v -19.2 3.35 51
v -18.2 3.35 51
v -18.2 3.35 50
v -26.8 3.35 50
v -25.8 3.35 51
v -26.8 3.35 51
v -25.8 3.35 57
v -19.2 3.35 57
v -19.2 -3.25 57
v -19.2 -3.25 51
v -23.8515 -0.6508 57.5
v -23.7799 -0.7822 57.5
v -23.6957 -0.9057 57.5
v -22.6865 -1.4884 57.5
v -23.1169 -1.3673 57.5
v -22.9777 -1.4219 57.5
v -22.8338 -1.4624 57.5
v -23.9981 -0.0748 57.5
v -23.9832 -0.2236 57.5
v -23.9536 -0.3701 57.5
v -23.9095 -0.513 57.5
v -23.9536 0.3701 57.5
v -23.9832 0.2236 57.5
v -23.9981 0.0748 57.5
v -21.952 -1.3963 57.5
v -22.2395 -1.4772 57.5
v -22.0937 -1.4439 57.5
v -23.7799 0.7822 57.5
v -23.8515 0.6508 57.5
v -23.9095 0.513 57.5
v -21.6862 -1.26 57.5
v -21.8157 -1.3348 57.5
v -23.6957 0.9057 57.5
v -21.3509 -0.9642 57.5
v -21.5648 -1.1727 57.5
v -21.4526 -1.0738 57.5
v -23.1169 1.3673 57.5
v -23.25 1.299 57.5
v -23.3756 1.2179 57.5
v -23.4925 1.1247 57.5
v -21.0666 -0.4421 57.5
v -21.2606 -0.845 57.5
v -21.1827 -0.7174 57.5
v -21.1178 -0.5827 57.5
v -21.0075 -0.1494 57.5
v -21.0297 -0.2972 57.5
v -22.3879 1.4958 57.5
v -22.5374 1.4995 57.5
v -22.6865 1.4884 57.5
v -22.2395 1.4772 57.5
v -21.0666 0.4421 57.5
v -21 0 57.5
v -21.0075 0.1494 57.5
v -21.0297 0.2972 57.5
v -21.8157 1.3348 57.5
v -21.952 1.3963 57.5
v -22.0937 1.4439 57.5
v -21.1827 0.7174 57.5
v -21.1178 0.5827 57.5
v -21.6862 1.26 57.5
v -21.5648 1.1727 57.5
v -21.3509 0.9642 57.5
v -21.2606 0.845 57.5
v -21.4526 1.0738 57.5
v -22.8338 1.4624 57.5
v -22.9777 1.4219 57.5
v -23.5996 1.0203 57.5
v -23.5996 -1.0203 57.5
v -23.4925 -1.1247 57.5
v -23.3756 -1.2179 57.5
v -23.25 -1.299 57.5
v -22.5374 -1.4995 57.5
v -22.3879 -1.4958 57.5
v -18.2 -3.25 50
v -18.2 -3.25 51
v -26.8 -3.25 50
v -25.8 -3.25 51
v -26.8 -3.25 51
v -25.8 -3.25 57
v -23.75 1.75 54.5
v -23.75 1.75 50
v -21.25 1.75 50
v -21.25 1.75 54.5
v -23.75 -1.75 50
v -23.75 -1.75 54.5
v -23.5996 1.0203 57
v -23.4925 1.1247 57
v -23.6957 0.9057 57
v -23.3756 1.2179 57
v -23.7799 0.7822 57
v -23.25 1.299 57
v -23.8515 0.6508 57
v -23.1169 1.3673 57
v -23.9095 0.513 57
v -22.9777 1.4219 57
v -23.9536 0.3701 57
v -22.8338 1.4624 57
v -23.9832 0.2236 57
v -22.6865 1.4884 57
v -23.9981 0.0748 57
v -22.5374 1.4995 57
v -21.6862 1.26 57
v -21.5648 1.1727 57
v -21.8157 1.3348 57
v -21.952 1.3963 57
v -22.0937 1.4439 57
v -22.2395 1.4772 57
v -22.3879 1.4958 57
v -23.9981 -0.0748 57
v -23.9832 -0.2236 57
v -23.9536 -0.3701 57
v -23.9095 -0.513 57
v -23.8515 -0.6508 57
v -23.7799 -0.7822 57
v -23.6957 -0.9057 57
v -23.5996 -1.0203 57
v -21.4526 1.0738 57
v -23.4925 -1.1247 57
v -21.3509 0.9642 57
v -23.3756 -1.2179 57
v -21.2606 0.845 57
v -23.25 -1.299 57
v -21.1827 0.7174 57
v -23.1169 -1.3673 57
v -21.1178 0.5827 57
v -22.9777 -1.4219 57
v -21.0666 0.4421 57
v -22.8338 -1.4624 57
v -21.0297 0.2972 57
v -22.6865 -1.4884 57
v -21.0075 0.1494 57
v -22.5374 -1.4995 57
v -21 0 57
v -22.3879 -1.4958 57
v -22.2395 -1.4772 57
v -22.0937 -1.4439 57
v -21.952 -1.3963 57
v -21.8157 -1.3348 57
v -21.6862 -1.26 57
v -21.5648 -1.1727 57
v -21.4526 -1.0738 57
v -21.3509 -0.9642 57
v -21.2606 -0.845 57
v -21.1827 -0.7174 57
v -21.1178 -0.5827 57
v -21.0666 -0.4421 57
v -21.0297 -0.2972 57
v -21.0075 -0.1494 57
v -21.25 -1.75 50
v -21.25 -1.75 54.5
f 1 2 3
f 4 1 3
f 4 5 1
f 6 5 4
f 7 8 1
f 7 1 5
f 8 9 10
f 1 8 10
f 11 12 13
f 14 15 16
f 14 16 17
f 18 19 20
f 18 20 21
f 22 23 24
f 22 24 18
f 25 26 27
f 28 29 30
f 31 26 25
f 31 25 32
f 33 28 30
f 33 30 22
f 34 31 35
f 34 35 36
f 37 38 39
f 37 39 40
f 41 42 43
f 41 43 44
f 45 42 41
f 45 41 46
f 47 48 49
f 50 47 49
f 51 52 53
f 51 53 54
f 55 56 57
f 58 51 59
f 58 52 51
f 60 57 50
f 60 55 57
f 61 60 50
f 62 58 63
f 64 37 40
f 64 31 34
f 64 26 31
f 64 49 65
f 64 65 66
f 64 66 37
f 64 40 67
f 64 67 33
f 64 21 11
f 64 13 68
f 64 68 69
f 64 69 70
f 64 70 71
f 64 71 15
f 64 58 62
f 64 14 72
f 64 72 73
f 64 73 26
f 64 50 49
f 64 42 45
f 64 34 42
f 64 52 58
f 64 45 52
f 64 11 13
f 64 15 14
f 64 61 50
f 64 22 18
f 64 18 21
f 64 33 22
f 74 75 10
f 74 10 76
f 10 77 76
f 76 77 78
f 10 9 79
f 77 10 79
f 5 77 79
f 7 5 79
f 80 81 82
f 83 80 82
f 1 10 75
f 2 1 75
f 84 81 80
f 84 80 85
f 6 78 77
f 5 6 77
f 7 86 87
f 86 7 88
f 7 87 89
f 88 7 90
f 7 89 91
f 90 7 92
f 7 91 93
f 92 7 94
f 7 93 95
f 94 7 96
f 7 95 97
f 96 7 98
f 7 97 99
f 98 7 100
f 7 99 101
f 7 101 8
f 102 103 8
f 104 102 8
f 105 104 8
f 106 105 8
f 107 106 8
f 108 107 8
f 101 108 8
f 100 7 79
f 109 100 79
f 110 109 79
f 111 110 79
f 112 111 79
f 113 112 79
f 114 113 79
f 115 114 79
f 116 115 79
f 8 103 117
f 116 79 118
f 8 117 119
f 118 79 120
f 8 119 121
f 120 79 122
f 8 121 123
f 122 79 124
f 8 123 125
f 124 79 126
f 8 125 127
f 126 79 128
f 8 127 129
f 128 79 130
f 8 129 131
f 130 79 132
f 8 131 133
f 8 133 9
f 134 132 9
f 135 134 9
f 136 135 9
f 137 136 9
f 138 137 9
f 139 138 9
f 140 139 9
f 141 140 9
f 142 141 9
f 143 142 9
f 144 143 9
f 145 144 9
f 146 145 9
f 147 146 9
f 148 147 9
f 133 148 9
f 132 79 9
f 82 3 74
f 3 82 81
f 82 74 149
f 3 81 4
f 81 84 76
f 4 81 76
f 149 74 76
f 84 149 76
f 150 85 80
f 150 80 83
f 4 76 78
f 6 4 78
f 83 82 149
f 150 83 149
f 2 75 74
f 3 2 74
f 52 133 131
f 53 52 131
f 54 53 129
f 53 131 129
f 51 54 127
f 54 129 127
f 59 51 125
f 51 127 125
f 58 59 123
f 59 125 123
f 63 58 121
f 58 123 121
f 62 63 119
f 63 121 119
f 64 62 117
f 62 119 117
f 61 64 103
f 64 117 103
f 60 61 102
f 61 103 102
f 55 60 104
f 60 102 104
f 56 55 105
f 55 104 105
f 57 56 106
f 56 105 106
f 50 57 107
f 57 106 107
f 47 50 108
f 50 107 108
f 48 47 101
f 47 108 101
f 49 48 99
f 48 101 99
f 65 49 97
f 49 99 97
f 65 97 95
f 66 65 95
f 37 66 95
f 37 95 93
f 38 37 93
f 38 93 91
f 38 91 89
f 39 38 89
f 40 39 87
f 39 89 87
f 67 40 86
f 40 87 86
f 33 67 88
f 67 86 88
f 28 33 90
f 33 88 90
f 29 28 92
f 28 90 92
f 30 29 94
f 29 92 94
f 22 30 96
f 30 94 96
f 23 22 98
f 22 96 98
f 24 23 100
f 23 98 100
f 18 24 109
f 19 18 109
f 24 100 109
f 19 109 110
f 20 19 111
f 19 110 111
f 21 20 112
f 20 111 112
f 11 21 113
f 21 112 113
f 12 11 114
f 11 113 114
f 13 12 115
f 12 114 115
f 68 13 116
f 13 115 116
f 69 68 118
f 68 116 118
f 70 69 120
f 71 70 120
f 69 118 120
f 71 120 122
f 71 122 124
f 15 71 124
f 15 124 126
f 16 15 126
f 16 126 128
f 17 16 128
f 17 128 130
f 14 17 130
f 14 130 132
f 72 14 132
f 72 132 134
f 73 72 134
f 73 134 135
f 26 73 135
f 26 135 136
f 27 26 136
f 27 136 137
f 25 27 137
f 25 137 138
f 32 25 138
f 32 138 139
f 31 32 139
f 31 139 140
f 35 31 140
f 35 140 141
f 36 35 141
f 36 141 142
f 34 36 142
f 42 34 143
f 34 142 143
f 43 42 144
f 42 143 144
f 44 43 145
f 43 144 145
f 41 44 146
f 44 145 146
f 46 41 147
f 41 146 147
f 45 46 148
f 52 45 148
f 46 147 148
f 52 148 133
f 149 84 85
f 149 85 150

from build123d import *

# Parameters (mm, degrees)
SKETCH014_W      = 2.5
SKETCH014_H      = 3.5
EXTRUDE015_DEPTH = 4.5
EXTRUDE014_DEPTH = 6.6
SKETCH039_R      = 1.5
EXTRUDE047_DEPTH = 0.5


with BuildPart() as extrude015:
    # Sketch014 → Extrude015 (new body)
    with BuildSketch(Plane(origin=(0, 0, -10), x_dir=(1, 0, 0), z_dir=(0, 0, -1))):
        Rectangle(SKETCH014_W, SKETCH014_H)
    extrude(amount=-EXTRUDE015_DEPTH)


with BuildPart() as extrude015_1:
    # Extrude015 placement: moved
    add(extrude015.part.moved(Location((0, 0, 10))))


with BuildPart() as cap003:
    # Sketch013 → Extrude014 (new body)
    with BuildSketch(Plane.XZ.offset(10)):
        Polygon((-3.3, 7), (3.3, 7), (3.3, 1), (4.3, 1), (4.3, 0), (-4.3, 0), (-4.3, 1), (-3.3, 1), align=None)
    extrude(amount=-EXTRUDE014_DEPTH)


with BuildPart() as cap003_1:
    # Extrude014 placement: moved
    add(cap003.part.moved(Location((0, 6.75, 0))))

    # Cut023: cut Extrude015
    add(extrude015_1.part, mode=Mode.SUBTRACT)


with BuildPart() as shutter:
    # Sketch039 → Extrude047 (new body)
    with BuildSketch(Plane.XY.offset(20)):
        Circle(SKETCH039_R)
    extrude(amount=EXTRUDE047_DEPTH)


with BuildPart() as shutter_1:
    # Extrude047 placement: moved
    add(shutter.part.moved(Location((0, 0, -13))))

    # Fusion035: union cap003
    add(cap003_1.part)


with BuildPart() as shutter_2:
    # Fusion035 placement: moved
    add(shutter_1.part.moved(Location((-22.5, 0, 50))))


solid = shutter_2.part
